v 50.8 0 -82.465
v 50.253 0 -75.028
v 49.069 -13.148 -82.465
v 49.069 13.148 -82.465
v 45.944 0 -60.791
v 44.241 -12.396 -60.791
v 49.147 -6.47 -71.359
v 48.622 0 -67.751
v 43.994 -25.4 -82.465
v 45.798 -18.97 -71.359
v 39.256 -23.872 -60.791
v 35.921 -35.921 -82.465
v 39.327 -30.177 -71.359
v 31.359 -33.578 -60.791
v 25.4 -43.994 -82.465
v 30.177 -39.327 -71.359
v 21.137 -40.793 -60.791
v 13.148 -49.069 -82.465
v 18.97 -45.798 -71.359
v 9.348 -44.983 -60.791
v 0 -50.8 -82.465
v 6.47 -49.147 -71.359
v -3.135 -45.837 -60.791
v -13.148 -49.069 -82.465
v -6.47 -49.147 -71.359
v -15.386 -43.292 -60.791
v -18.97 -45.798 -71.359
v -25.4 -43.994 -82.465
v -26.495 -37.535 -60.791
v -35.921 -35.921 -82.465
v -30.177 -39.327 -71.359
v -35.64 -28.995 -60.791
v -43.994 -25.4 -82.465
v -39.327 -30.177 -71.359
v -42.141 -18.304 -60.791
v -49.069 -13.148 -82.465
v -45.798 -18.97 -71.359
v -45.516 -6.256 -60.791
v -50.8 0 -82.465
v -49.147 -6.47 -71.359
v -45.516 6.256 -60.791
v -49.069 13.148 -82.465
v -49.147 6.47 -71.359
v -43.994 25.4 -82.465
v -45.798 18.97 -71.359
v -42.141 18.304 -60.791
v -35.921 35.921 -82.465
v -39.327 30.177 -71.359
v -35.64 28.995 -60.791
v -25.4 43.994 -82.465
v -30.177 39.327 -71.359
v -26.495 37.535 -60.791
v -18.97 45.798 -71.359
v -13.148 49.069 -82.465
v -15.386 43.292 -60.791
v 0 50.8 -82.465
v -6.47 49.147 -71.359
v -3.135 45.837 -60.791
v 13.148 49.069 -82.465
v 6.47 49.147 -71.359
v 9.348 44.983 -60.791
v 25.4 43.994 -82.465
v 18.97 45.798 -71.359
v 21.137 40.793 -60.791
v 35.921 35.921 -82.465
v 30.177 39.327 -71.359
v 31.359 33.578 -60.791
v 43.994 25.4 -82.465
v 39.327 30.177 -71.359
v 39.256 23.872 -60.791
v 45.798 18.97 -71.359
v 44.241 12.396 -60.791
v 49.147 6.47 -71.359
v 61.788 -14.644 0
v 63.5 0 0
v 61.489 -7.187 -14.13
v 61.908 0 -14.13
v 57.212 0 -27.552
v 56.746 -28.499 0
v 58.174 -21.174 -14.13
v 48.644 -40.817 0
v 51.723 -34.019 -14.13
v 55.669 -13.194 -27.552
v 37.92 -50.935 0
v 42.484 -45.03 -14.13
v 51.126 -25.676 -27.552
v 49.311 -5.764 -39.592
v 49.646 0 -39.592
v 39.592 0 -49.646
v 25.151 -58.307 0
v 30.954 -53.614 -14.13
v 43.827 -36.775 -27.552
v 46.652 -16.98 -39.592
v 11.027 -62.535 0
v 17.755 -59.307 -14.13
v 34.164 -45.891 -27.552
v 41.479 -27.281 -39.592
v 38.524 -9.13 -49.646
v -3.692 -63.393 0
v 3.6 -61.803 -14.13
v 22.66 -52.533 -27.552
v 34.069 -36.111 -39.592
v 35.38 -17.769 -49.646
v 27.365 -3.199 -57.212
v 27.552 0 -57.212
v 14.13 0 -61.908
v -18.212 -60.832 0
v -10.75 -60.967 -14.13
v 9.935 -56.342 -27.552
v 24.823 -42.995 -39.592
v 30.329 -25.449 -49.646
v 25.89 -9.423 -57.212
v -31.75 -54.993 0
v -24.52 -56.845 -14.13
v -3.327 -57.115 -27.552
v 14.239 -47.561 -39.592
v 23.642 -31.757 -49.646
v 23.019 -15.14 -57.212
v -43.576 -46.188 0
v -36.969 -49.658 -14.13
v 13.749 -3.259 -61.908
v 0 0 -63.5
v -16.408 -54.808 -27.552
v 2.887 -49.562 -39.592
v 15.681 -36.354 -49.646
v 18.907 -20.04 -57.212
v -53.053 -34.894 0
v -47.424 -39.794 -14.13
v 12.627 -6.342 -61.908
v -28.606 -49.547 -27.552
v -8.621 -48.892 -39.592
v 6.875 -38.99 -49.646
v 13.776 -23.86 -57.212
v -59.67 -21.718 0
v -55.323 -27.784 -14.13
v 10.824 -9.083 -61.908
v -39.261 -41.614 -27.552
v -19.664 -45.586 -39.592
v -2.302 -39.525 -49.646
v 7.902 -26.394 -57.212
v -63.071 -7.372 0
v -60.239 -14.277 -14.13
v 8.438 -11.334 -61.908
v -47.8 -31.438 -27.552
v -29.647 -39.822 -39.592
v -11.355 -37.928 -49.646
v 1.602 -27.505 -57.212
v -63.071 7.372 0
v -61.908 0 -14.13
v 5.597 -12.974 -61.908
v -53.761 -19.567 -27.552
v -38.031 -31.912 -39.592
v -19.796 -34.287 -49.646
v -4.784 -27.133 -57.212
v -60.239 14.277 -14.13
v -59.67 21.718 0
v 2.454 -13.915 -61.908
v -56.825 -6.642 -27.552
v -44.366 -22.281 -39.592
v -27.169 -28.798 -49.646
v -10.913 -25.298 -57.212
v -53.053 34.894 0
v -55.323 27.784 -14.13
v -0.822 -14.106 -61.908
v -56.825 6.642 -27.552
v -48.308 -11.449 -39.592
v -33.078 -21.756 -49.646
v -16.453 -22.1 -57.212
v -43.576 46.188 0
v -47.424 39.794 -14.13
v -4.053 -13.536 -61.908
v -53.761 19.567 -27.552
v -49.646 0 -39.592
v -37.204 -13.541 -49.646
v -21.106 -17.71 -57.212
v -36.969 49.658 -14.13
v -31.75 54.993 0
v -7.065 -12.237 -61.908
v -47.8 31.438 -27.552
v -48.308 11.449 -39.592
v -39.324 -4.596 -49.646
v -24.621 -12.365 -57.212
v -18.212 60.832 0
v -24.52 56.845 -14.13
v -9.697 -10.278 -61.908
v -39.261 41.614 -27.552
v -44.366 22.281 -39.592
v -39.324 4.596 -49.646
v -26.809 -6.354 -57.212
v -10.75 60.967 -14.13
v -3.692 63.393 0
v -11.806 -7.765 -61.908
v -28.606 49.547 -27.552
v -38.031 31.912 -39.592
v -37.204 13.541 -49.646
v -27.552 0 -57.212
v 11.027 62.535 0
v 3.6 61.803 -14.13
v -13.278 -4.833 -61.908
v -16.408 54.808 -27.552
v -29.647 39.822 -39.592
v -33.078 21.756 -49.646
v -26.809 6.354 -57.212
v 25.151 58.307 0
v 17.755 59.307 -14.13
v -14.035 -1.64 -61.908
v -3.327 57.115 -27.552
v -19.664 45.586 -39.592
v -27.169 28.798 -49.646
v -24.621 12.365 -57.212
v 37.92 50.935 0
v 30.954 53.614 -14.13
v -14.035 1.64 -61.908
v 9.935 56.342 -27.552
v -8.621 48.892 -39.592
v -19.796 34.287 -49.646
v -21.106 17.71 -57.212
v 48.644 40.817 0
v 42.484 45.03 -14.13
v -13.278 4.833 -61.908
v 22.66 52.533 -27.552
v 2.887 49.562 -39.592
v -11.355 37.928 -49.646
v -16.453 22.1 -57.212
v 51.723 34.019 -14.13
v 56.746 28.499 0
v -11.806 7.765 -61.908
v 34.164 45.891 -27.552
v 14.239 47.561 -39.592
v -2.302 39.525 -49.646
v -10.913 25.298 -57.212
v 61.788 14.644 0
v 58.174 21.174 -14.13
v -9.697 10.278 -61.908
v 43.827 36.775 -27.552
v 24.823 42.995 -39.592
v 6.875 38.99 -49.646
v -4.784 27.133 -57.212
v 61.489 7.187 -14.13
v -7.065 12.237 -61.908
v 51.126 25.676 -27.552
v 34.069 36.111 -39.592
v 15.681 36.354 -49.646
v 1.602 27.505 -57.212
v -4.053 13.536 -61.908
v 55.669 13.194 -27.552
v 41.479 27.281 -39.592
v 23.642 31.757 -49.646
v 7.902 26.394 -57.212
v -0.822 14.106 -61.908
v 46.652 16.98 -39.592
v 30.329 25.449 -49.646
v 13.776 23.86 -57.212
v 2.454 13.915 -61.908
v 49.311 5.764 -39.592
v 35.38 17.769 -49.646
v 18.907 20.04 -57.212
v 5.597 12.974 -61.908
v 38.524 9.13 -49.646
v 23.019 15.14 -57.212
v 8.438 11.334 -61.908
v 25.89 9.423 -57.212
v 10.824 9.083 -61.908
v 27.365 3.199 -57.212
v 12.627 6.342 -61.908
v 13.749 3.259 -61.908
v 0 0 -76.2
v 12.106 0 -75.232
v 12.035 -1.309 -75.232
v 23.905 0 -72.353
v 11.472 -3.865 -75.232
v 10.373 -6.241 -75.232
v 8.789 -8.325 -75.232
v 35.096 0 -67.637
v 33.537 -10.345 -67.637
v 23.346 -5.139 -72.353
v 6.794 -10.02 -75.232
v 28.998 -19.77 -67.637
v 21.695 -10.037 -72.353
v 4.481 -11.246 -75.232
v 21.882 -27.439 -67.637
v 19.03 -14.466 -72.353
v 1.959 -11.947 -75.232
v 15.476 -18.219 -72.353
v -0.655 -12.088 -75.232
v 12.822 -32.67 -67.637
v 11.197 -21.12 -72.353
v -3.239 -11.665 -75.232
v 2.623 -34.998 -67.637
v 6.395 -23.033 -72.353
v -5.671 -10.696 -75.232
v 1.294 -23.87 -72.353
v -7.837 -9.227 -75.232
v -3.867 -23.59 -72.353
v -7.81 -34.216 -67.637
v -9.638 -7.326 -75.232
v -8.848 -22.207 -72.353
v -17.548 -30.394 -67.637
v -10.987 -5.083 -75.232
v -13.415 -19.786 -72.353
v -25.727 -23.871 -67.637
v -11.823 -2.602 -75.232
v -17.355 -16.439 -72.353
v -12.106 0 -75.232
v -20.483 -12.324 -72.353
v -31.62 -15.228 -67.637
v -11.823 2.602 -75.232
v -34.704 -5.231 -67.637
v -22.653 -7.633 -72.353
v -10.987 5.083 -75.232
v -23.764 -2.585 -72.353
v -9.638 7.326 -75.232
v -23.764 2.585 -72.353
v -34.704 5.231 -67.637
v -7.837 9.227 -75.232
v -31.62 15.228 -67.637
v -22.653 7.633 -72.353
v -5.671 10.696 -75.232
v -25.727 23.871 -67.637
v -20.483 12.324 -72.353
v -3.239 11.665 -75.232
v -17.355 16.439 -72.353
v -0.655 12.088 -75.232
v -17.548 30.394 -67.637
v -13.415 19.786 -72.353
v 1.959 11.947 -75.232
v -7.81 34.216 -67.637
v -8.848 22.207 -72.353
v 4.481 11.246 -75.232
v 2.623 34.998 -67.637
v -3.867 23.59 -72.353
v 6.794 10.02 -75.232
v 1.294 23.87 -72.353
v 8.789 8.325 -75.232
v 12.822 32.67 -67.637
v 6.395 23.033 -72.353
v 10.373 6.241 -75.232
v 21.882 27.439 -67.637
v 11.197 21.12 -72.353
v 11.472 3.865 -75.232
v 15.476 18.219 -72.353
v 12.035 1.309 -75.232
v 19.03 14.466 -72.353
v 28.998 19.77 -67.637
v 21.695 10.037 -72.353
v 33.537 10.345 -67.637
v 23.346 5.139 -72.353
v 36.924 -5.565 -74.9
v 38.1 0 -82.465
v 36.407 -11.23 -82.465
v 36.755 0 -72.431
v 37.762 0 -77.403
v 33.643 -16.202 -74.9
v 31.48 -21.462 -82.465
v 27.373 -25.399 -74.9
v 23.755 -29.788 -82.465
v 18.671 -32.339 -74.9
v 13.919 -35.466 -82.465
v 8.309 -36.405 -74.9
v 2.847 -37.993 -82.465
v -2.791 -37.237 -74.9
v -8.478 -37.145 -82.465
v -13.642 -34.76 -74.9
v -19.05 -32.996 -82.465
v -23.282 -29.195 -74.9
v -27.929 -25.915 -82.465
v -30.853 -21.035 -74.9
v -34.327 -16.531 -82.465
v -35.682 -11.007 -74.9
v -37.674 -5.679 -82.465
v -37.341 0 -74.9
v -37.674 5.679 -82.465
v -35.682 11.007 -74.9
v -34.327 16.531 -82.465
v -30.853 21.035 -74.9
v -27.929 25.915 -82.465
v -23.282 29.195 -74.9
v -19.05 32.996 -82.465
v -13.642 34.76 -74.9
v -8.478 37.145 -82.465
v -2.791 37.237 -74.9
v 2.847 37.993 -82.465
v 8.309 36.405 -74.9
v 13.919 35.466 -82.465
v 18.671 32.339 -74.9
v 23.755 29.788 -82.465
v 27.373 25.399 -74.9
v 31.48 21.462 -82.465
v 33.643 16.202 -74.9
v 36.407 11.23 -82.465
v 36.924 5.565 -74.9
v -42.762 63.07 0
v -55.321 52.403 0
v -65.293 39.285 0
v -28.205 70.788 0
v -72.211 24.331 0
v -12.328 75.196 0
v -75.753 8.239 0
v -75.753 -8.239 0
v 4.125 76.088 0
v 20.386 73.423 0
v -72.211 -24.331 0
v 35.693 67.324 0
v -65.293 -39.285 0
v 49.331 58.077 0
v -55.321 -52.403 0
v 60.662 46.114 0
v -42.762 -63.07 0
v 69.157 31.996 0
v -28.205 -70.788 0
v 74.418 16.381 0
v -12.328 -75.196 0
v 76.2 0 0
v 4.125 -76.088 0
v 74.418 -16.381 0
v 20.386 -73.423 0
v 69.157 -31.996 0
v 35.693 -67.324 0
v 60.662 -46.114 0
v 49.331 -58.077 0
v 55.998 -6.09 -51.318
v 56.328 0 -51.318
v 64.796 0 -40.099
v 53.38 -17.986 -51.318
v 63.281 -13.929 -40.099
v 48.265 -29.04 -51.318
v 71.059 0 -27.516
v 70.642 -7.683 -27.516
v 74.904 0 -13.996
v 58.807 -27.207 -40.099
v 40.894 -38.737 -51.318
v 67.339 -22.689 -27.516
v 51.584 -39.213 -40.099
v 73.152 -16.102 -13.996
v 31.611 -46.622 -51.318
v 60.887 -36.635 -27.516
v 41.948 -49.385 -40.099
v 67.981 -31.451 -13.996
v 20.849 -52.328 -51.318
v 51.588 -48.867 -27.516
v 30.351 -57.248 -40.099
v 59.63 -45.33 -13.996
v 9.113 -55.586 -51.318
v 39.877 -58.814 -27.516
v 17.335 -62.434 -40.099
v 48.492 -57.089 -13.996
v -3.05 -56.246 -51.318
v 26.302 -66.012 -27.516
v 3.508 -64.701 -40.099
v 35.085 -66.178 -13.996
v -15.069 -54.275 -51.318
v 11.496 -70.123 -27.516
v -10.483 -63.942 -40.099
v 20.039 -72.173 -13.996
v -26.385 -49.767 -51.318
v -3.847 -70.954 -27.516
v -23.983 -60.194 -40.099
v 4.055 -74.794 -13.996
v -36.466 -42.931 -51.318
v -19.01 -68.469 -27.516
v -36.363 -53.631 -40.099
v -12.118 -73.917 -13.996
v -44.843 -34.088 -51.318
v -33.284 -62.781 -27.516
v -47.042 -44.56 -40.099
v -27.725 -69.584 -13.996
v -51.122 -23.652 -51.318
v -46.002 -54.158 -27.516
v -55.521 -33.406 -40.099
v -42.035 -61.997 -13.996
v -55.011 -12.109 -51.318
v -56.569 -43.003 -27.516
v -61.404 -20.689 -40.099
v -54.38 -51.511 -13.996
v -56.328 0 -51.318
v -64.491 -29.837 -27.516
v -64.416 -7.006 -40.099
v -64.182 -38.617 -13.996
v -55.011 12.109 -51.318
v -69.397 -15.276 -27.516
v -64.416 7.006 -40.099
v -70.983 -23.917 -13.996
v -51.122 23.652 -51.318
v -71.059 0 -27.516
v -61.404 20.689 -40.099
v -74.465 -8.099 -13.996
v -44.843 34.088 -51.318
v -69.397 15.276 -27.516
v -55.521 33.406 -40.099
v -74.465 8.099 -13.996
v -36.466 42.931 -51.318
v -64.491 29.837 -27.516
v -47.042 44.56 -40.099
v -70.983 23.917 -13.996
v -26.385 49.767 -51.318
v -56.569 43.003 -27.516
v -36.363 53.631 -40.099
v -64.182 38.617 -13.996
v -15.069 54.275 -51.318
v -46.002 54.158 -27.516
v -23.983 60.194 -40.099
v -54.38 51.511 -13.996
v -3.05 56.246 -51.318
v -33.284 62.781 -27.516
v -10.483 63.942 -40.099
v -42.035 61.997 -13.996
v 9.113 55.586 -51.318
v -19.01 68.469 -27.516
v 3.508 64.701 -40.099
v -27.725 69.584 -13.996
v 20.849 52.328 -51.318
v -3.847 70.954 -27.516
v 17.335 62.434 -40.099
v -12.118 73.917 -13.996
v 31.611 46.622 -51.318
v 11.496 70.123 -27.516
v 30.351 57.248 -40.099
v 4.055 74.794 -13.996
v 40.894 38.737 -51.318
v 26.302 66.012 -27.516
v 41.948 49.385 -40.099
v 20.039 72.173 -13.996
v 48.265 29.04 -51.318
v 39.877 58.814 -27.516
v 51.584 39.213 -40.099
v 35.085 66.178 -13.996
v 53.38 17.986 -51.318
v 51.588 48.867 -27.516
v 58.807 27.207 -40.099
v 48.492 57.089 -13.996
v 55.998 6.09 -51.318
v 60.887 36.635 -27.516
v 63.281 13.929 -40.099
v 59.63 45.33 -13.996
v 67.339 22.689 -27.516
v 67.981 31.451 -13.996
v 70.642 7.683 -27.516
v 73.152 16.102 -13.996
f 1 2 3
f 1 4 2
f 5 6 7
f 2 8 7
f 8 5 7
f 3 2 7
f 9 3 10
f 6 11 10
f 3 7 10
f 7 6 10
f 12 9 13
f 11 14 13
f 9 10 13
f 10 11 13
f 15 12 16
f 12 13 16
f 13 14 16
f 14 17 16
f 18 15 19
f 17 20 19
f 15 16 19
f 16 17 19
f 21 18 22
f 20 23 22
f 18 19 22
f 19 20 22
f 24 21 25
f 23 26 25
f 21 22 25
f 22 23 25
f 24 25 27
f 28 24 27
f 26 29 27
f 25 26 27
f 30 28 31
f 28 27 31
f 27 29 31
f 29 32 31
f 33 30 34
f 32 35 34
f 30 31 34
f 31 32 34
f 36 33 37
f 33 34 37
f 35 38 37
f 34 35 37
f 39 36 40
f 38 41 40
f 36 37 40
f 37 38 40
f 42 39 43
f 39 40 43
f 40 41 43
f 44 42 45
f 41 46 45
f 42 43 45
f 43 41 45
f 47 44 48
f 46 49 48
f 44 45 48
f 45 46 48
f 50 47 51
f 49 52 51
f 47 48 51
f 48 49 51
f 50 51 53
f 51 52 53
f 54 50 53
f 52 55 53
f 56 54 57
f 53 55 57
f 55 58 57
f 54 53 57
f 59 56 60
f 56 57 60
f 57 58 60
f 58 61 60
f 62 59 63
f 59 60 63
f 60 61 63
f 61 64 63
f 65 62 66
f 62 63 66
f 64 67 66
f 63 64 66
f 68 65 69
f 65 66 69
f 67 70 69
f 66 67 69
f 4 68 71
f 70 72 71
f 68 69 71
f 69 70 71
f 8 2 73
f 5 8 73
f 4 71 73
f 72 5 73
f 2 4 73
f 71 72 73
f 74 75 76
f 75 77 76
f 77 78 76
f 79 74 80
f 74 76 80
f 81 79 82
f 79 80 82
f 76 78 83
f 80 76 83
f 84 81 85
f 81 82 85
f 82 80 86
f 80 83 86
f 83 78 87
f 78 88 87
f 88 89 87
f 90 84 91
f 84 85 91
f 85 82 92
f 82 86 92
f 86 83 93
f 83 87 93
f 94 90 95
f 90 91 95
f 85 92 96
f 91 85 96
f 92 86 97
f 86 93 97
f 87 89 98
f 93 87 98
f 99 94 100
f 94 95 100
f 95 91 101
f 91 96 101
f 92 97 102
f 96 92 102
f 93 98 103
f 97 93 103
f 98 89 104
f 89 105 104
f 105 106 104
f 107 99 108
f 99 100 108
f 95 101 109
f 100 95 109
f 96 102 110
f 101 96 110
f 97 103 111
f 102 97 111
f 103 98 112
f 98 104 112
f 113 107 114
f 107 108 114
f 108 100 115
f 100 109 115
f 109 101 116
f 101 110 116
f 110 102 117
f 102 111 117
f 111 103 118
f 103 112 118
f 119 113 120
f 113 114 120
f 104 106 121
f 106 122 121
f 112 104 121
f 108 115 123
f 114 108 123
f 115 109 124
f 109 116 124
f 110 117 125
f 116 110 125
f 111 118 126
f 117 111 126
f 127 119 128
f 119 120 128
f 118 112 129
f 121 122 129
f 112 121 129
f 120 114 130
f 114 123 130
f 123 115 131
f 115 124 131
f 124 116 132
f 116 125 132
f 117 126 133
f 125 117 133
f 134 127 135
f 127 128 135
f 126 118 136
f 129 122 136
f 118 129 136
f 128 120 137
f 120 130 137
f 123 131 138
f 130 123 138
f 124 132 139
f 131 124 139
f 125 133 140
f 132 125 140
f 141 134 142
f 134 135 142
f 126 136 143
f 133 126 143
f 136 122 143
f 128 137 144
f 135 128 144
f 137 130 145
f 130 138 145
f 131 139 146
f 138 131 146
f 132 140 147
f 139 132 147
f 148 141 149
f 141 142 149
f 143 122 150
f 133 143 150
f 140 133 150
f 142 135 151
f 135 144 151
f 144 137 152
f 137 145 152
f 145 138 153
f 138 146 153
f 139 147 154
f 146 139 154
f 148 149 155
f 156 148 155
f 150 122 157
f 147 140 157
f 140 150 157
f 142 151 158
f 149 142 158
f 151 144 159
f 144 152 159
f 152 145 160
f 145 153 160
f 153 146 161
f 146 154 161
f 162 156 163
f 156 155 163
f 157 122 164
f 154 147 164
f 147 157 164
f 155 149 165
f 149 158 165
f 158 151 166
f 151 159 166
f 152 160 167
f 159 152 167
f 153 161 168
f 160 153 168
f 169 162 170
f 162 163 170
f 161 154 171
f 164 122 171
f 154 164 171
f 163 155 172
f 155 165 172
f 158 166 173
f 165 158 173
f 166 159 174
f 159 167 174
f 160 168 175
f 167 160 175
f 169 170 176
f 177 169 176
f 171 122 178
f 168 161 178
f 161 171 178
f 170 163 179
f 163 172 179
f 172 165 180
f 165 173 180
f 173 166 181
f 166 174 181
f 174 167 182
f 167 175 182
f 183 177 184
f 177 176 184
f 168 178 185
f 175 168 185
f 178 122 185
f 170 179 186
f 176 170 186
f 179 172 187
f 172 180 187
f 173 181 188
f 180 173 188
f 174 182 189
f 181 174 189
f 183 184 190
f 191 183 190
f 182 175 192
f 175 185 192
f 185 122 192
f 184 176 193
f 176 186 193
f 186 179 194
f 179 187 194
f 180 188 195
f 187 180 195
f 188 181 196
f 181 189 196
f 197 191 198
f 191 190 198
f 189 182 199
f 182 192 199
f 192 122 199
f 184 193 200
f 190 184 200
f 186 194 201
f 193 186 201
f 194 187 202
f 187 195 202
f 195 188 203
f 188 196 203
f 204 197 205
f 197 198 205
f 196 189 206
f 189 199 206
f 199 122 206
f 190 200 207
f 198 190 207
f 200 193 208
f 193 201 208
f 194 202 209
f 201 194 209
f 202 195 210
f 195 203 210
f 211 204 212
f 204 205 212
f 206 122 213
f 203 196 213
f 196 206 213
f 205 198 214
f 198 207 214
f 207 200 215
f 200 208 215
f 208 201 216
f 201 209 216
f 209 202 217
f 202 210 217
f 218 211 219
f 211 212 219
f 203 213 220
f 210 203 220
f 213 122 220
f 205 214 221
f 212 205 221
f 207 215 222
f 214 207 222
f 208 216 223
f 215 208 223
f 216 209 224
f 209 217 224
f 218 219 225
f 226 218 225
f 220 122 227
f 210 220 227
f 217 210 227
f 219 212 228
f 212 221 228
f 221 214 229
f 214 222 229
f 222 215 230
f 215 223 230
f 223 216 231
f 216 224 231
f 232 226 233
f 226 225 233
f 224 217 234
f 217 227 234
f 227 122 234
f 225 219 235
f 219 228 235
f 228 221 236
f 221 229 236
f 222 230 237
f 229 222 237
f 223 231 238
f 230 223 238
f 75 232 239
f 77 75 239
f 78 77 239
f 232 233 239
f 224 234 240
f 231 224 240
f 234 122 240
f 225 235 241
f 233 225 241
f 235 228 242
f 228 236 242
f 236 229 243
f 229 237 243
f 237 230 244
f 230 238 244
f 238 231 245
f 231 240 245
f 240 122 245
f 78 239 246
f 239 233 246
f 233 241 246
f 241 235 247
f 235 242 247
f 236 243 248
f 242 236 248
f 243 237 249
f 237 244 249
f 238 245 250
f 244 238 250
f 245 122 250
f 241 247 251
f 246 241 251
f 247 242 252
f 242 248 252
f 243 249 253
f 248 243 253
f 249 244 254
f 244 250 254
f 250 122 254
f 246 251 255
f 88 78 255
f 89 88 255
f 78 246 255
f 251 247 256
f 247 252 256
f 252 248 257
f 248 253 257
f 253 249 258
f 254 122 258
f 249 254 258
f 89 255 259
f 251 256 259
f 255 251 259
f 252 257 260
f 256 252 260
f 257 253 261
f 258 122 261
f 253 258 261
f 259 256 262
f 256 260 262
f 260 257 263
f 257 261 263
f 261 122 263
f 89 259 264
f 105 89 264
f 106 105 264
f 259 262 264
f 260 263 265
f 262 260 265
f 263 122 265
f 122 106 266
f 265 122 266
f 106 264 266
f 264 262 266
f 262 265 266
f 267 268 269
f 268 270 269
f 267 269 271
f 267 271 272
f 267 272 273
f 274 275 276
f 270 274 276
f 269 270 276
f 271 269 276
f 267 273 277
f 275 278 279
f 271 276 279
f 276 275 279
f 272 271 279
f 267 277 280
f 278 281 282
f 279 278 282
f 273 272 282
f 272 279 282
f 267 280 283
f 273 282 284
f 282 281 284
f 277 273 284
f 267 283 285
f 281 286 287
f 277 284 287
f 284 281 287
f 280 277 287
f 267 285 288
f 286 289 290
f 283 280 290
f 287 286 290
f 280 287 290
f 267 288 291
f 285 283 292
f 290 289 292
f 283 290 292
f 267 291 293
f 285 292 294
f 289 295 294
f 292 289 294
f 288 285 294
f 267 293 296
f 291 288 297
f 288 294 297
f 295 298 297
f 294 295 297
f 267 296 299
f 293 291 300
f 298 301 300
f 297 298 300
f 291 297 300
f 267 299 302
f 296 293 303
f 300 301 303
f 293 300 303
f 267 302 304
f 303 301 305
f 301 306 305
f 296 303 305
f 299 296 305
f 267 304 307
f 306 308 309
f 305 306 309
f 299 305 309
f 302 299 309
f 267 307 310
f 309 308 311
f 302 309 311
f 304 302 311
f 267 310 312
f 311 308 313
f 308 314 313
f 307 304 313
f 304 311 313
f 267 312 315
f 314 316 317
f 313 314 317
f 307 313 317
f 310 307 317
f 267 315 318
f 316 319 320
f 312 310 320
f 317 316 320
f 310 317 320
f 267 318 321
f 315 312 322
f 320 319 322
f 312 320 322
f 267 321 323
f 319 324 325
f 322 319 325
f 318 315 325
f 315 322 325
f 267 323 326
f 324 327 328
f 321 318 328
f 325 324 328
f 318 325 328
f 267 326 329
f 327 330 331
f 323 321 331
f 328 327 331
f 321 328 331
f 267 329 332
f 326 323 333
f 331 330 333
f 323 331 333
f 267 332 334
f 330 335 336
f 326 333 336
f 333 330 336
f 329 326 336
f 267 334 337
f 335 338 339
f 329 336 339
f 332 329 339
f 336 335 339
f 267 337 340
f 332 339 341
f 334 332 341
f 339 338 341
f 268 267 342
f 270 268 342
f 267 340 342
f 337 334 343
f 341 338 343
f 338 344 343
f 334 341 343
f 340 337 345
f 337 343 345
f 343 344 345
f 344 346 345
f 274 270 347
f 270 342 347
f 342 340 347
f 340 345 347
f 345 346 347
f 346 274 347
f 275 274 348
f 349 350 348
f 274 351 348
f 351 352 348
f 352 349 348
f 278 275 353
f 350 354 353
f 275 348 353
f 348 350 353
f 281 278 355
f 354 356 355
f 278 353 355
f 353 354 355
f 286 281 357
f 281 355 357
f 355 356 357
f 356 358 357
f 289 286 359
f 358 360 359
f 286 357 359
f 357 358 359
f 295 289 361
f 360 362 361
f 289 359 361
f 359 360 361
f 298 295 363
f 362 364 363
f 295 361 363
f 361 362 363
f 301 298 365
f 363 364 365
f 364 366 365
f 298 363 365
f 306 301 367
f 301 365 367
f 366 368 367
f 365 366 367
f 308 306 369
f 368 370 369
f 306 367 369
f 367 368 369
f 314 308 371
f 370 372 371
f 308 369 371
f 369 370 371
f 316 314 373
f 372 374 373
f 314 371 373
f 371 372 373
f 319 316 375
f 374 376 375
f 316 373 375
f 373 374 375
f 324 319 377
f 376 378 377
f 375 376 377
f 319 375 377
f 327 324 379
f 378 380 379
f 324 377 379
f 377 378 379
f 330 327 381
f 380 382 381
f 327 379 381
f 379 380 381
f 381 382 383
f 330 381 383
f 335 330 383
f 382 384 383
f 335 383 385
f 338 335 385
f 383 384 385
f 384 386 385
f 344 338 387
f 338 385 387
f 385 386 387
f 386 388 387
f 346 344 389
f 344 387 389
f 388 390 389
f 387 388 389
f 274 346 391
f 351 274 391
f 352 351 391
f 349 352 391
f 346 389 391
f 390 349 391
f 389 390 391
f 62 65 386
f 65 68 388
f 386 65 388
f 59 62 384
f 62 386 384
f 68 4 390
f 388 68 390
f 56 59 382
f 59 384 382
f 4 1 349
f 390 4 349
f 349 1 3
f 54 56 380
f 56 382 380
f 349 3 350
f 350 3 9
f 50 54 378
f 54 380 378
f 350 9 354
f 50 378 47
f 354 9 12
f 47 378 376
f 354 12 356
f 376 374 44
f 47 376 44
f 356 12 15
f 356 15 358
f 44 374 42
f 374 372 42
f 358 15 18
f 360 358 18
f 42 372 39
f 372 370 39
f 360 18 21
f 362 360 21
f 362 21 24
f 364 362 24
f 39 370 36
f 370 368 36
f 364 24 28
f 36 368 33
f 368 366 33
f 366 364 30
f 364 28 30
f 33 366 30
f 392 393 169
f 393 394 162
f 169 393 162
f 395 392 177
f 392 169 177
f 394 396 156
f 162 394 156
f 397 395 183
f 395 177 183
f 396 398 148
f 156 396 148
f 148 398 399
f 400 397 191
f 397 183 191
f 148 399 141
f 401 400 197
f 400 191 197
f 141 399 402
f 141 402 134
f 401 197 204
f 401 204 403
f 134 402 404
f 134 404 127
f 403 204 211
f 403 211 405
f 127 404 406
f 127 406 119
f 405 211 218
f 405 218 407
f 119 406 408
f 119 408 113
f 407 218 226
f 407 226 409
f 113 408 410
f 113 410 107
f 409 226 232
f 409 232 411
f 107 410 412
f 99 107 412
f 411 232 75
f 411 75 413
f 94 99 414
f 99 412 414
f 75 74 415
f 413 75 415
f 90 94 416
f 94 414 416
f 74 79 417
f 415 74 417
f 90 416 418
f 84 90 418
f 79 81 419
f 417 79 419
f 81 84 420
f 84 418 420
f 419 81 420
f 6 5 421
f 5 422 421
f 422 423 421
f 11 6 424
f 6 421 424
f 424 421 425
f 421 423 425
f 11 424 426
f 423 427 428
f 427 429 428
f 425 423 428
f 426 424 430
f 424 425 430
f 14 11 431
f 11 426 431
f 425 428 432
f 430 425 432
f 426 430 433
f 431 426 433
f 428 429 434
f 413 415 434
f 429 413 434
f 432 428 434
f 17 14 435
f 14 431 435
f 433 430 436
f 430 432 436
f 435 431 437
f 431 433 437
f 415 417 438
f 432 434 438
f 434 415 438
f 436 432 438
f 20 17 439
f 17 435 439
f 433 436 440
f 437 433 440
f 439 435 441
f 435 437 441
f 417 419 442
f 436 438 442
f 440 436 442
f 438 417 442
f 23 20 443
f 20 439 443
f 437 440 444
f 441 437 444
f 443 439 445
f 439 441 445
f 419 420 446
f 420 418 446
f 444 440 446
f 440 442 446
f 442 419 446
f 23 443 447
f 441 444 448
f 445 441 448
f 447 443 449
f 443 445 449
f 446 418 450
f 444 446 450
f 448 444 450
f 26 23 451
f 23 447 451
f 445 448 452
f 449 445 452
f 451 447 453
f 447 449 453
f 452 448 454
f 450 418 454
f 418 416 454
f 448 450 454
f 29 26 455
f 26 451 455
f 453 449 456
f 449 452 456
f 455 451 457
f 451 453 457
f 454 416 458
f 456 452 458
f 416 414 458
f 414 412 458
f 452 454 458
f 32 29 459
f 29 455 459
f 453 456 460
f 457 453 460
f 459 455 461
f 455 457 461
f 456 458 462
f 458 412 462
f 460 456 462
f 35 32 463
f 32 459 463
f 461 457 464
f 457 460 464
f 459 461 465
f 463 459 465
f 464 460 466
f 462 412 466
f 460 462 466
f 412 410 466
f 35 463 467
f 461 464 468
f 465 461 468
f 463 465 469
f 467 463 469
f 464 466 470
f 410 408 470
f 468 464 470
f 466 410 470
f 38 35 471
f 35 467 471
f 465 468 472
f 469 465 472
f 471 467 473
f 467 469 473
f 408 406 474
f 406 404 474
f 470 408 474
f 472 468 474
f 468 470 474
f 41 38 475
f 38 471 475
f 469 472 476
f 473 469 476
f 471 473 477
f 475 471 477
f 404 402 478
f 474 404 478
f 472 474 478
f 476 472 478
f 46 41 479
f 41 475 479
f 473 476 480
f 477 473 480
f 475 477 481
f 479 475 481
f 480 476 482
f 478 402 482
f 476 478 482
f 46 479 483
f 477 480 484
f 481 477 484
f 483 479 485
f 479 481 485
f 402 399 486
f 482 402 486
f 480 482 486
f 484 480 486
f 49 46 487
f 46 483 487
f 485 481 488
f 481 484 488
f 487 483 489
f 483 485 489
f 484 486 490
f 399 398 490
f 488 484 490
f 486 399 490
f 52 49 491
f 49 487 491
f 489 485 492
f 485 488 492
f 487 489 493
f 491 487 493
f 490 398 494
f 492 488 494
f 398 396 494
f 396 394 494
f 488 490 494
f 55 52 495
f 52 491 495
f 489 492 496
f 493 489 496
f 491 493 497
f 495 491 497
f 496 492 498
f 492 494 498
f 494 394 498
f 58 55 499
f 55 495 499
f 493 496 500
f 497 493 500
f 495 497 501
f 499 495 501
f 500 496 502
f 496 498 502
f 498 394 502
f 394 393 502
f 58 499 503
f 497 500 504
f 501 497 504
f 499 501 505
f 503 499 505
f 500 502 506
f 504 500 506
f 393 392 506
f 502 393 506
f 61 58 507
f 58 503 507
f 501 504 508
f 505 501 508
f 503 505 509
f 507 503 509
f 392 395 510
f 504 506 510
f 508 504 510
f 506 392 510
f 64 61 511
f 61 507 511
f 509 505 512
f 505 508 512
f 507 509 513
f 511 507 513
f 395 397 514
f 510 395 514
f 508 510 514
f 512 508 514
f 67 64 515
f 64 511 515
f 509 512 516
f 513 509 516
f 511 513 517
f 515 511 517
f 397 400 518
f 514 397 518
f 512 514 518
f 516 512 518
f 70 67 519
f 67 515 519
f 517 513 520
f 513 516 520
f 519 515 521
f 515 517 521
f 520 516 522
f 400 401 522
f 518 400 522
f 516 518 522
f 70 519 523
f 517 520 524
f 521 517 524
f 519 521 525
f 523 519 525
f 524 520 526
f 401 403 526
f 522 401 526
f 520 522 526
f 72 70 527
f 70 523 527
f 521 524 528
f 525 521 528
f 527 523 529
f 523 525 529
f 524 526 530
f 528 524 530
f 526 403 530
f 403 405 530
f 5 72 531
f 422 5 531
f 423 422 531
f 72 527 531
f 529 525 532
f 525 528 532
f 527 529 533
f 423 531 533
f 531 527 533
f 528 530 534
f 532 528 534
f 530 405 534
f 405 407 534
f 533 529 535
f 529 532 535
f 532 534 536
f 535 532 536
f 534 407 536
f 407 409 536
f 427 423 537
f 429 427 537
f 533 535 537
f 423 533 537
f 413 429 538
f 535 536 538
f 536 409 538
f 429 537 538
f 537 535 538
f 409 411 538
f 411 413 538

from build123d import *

# Parameters (mm, degrees)
F3_SCALE = 2


with BuildPart() as f2:
    # F1 (on Front) → F2 (revolve)
    with BuildSketch(Plane.XZ):
        with BuildLine():
            Line((19.05, -41.2325449288), (25.4, -41.2325449288))
            ThreePointArc((25.4, -41.2325449288), (24.7856075246, -35.6797384638), (22.9721527844, -30.3955621177))
            ThreePointArc((22.9721527844, -30.3955621177), (34.1090092284, -16.9760269043), (38.1, 0))
            Line((38.1, 0), (31.75, 0))
            ThreePointArc((31.75, 0), (22.4506403027, -22.4506403027), (0, -31.75))
            Line((0, -31.75), (0, -38.1))
            ThreePointArc((0, -38.1), (9.0313967854, -37.0141036918), (17.5479819998, -33.8183134963))
            ThreePointArc((17.5479819998, -33.8183134963), (18.6707198187, -37.4501222327), (19.05, -41.2325449288))
        make_face()
    revolve(axis=Axis((0, 0, 1.3704523444), (0, 0, -1)))


with BuildPart() as f2_1:
    # F3: moved
    add(f2.part.scale(F3_SCALE))


solid = f2_1.part
